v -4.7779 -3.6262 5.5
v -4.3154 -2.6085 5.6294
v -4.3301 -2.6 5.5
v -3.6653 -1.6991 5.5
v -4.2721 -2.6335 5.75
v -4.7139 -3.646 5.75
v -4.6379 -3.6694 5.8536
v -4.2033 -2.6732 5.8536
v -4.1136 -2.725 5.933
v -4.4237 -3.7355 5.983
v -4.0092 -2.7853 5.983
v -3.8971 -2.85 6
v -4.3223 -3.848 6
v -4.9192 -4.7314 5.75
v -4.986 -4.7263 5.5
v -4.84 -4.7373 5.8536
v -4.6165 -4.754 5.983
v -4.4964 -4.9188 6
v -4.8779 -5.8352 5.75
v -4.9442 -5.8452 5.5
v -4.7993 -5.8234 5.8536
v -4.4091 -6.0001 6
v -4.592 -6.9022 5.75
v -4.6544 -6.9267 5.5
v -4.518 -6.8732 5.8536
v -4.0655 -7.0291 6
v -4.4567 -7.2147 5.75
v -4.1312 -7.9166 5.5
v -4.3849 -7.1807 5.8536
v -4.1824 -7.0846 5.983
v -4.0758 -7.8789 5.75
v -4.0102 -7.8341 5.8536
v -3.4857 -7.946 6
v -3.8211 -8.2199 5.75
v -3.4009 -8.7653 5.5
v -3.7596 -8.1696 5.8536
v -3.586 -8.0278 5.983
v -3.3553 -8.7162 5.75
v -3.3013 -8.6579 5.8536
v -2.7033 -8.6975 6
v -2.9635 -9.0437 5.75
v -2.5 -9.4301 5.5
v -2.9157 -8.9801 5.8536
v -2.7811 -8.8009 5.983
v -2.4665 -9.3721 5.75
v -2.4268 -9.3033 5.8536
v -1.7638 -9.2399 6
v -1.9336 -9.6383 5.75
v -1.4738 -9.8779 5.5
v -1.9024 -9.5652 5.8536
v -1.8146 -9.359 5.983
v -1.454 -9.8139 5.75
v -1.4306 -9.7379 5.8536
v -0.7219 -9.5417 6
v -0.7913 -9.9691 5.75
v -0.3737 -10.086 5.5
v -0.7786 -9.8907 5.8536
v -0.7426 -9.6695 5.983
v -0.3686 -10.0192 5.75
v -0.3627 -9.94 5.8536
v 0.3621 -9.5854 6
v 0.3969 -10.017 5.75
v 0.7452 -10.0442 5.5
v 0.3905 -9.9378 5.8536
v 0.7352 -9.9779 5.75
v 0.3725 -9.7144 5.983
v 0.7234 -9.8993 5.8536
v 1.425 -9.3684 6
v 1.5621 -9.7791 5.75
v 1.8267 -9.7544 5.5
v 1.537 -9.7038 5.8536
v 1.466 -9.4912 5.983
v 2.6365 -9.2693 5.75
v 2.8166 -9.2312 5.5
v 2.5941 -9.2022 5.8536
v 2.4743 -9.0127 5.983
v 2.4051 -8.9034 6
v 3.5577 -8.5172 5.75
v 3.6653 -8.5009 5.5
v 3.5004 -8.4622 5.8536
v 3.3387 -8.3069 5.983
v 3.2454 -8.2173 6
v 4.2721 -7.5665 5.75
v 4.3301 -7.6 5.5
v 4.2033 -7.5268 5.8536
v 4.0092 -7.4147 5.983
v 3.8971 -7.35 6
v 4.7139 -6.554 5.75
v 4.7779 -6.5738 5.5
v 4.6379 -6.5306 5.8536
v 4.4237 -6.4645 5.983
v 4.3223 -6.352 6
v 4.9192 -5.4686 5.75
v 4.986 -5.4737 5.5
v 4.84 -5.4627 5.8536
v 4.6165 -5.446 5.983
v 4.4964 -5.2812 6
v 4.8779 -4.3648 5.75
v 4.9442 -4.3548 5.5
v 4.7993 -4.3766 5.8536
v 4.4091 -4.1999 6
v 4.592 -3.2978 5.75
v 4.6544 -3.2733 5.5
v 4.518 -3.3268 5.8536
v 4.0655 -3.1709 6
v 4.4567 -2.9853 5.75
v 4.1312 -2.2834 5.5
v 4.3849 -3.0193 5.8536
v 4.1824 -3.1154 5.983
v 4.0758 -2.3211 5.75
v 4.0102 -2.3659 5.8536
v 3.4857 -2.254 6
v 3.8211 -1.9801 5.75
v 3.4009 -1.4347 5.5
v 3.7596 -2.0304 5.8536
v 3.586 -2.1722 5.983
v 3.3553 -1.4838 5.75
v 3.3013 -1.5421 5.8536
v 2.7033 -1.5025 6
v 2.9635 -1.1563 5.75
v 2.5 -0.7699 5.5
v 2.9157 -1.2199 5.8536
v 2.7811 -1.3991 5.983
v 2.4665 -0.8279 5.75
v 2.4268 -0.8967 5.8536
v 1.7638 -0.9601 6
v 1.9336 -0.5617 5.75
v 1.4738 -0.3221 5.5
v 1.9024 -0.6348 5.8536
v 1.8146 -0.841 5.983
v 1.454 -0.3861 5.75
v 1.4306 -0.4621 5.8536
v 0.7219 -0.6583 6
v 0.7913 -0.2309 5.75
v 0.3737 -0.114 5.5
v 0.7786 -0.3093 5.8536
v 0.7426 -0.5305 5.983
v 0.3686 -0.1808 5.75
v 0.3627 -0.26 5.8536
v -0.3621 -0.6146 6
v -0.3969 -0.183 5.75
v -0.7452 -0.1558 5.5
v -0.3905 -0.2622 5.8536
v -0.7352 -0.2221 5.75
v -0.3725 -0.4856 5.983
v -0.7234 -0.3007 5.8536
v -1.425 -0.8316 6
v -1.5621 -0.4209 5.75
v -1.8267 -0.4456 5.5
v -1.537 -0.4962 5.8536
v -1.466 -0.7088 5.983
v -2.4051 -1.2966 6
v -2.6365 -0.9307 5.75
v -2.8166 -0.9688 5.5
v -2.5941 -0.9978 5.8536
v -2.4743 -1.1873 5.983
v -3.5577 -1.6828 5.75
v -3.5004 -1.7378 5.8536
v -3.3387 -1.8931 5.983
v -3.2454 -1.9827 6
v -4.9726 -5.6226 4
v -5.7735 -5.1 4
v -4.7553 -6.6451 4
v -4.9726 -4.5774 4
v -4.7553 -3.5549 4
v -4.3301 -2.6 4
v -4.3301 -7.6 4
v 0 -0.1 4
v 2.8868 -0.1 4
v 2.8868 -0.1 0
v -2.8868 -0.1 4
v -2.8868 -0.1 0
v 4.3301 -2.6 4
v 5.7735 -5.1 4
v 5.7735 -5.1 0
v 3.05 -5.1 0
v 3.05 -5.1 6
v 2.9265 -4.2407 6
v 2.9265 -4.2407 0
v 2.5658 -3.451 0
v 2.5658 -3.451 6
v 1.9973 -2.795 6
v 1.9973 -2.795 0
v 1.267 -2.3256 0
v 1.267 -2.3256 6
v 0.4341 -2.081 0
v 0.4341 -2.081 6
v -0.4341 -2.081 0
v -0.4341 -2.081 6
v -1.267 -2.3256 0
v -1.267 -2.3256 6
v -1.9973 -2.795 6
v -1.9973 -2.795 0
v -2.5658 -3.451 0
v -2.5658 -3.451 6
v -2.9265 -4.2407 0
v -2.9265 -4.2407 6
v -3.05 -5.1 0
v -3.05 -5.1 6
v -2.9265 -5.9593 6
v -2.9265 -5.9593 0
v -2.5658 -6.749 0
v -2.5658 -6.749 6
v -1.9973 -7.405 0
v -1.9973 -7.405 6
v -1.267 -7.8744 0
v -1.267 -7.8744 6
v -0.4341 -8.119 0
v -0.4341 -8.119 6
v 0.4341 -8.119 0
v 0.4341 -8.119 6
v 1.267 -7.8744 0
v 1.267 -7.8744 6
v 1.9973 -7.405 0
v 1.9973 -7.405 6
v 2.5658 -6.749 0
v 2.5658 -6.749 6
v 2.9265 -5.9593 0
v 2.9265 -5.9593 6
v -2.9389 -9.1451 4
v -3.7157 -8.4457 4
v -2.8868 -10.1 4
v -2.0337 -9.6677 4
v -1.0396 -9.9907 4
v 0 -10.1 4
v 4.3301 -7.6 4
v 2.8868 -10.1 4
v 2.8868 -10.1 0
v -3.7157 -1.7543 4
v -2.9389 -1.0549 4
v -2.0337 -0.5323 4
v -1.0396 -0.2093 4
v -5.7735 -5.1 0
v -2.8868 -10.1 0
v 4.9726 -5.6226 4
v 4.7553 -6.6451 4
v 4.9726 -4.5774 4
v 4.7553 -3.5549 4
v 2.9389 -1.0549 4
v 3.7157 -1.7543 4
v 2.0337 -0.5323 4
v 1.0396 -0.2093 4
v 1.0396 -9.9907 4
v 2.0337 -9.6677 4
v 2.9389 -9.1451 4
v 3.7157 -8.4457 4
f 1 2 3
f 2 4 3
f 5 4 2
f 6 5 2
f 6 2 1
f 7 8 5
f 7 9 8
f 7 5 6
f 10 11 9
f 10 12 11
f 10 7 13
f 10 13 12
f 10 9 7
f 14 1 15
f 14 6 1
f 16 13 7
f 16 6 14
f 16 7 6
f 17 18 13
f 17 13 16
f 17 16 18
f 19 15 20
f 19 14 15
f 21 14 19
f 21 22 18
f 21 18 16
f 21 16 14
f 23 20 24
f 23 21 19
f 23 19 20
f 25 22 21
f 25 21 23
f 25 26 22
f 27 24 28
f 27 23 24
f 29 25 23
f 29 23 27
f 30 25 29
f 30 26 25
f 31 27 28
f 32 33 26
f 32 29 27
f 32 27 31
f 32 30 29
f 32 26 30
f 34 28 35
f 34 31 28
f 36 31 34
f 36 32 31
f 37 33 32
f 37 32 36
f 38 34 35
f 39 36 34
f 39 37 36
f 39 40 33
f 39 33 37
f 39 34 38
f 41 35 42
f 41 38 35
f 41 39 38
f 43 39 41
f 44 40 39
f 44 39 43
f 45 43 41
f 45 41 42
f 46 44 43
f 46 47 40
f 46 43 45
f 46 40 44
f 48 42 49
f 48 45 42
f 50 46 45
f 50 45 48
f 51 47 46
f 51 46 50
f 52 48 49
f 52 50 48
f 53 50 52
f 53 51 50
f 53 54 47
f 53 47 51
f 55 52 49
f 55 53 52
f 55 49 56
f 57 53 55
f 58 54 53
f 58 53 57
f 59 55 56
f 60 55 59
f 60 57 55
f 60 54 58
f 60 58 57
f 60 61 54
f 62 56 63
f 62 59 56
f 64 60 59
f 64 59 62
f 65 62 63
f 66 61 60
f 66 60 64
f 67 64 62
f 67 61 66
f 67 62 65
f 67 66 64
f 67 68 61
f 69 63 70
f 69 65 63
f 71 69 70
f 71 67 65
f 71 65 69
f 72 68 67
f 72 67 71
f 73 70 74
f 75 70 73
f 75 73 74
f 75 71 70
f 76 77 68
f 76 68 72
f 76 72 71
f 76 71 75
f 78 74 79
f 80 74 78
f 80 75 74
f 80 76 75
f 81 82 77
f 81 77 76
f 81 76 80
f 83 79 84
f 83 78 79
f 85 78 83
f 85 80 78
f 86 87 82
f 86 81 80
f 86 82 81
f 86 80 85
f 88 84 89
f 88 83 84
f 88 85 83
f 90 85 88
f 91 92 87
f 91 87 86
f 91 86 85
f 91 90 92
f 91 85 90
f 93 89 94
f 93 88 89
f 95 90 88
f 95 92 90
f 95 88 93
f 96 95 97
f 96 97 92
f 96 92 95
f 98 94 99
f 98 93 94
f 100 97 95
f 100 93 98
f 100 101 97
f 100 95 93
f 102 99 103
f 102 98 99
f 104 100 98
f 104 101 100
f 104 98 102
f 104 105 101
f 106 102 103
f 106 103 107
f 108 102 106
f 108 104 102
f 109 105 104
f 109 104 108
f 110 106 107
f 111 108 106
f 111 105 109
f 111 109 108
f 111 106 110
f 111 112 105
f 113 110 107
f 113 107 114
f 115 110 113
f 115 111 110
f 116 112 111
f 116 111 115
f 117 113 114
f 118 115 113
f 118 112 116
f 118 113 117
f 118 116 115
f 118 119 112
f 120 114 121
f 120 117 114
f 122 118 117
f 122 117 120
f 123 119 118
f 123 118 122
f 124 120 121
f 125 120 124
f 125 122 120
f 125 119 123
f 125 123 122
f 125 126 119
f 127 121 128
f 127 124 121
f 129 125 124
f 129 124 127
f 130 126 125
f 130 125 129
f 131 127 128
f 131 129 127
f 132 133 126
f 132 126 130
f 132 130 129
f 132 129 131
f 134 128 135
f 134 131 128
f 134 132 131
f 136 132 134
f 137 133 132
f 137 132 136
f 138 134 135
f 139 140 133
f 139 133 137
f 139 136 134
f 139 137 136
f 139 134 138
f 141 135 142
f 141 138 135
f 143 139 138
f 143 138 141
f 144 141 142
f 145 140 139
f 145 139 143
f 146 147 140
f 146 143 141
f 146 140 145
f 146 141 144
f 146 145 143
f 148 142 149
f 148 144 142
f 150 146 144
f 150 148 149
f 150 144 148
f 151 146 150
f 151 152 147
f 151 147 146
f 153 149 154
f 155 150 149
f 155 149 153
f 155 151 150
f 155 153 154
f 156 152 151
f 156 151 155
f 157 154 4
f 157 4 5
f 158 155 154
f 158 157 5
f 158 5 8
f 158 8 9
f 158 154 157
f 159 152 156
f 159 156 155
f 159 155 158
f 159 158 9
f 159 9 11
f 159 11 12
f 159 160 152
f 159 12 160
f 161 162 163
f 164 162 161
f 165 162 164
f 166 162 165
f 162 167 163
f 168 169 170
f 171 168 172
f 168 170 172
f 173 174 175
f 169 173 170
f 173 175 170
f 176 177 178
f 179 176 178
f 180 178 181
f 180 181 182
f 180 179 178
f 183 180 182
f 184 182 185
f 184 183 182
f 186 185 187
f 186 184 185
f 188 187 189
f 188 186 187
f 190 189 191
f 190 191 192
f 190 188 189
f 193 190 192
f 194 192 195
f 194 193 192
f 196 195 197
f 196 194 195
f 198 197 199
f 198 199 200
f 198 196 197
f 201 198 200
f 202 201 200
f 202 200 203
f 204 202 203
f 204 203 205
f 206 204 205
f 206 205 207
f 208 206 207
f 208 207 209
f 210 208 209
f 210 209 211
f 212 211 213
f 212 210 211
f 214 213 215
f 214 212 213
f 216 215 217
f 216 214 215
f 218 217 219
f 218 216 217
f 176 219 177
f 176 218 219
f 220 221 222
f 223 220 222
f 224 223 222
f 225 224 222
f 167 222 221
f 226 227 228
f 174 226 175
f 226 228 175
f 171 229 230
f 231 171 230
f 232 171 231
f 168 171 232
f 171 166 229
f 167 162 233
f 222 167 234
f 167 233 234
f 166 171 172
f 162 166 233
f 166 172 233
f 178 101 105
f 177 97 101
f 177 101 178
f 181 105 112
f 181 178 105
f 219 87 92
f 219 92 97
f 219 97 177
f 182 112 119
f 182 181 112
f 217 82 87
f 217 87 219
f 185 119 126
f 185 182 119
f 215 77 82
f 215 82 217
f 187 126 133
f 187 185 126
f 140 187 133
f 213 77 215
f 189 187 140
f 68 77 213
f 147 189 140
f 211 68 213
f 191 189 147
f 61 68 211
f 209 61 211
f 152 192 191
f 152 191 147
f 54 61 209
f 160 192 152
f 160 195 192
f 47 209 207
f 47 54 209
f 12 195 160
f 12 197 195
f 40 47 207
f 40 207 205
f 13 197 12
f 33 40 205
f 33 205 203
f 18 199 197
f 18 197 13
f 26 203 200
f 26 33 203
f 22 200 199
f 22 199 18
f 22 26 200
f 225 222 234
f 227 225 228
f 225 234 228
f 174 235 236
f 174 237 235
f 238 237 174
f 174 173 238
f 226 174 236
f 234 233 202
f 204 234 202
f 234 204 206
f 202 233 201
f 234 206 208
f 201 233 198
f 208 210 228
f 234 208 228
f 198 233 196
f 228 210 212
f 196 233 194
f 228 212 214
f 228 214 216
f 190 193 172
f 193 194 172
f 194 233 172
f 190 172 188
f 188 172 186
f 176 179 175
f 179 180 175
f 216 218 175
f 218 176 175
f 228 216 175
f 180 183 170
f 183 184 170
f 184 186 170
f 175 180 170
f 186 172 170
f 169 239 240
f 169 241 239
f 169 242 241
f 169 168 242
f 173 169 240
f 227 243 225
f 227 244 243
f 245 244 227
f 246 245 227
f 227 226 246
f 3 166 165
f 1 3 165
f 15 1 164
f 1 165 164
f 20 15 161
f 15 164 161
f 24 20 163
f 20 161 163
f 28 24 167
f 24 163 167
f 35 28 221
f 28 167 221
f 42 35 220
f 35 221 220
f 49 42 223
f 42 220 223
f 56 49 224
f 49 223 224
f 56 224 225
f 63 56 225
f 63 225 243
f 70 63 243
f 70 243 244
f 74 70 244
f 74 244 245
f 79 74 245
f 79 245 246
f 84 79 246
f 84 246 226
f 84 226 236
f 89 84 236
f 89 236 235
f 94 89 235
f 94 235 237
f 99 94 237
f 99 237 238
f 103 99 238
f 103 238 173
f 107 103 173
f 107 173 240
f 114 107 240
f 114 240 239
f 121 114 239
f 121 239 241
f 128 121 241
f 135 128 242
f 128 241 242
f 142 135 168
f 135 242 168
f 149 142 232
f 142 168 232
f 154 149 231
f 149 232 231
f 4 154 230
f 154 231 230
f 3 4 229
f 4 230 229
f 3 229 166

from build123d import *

# Parameters (mm, degrees)
SKETCH1_R           = 3.05
BOSS_EXTRUDE1_DEPTH = 4
SKETCH2_R           = 5
SKETCH2_R_2         = 3.05
BOSS_EXTRUDE2_DEPTH = 2
FILLET1_R           = 0.5


with BuildPart() as part:
    # Sketch1 → Boss-Extrude1 (new body)
    with BuildSketch(Plane.XY):
        Polygon((-2.886751346, -0.1), (-5.773502692, -5.1), (-2.886751346, -10.1), (2.886751346, -10.1), (5.773502692, -5.1), (2.886751346, -0.1), align=None)
        with Locations((0, -5.1)):
            Circle(SKETCH1_R, mode=Mode.SUBTRACT)
    extrude(amount=BOSS_EXTRUDE1_DEPTH)

    # Sketch2 → Boss-Extrude2 (add)
    with BuildSketch(Plane.XY.offset(4)):
        with Locations(Location((0, -5.1, 0), (0, 0, 150))):
            Circle(SKETCH2_R)
        with Locations((0, -5.1)):
            Circle(SKETCH2_R_2, mode=Mode.SUBTRACT)
    extrude(amount=BOSS_EXTRUDE2_DEPTH)

    # Fillet1
    fillet1_edges = [part.edges().sort_by_distance(p)[0] for p in [
        (4.330127019, -7.6, 6),
    ]]
    fillet(fillet1_edges, radius=FILLET1_R)


solid = part.part
